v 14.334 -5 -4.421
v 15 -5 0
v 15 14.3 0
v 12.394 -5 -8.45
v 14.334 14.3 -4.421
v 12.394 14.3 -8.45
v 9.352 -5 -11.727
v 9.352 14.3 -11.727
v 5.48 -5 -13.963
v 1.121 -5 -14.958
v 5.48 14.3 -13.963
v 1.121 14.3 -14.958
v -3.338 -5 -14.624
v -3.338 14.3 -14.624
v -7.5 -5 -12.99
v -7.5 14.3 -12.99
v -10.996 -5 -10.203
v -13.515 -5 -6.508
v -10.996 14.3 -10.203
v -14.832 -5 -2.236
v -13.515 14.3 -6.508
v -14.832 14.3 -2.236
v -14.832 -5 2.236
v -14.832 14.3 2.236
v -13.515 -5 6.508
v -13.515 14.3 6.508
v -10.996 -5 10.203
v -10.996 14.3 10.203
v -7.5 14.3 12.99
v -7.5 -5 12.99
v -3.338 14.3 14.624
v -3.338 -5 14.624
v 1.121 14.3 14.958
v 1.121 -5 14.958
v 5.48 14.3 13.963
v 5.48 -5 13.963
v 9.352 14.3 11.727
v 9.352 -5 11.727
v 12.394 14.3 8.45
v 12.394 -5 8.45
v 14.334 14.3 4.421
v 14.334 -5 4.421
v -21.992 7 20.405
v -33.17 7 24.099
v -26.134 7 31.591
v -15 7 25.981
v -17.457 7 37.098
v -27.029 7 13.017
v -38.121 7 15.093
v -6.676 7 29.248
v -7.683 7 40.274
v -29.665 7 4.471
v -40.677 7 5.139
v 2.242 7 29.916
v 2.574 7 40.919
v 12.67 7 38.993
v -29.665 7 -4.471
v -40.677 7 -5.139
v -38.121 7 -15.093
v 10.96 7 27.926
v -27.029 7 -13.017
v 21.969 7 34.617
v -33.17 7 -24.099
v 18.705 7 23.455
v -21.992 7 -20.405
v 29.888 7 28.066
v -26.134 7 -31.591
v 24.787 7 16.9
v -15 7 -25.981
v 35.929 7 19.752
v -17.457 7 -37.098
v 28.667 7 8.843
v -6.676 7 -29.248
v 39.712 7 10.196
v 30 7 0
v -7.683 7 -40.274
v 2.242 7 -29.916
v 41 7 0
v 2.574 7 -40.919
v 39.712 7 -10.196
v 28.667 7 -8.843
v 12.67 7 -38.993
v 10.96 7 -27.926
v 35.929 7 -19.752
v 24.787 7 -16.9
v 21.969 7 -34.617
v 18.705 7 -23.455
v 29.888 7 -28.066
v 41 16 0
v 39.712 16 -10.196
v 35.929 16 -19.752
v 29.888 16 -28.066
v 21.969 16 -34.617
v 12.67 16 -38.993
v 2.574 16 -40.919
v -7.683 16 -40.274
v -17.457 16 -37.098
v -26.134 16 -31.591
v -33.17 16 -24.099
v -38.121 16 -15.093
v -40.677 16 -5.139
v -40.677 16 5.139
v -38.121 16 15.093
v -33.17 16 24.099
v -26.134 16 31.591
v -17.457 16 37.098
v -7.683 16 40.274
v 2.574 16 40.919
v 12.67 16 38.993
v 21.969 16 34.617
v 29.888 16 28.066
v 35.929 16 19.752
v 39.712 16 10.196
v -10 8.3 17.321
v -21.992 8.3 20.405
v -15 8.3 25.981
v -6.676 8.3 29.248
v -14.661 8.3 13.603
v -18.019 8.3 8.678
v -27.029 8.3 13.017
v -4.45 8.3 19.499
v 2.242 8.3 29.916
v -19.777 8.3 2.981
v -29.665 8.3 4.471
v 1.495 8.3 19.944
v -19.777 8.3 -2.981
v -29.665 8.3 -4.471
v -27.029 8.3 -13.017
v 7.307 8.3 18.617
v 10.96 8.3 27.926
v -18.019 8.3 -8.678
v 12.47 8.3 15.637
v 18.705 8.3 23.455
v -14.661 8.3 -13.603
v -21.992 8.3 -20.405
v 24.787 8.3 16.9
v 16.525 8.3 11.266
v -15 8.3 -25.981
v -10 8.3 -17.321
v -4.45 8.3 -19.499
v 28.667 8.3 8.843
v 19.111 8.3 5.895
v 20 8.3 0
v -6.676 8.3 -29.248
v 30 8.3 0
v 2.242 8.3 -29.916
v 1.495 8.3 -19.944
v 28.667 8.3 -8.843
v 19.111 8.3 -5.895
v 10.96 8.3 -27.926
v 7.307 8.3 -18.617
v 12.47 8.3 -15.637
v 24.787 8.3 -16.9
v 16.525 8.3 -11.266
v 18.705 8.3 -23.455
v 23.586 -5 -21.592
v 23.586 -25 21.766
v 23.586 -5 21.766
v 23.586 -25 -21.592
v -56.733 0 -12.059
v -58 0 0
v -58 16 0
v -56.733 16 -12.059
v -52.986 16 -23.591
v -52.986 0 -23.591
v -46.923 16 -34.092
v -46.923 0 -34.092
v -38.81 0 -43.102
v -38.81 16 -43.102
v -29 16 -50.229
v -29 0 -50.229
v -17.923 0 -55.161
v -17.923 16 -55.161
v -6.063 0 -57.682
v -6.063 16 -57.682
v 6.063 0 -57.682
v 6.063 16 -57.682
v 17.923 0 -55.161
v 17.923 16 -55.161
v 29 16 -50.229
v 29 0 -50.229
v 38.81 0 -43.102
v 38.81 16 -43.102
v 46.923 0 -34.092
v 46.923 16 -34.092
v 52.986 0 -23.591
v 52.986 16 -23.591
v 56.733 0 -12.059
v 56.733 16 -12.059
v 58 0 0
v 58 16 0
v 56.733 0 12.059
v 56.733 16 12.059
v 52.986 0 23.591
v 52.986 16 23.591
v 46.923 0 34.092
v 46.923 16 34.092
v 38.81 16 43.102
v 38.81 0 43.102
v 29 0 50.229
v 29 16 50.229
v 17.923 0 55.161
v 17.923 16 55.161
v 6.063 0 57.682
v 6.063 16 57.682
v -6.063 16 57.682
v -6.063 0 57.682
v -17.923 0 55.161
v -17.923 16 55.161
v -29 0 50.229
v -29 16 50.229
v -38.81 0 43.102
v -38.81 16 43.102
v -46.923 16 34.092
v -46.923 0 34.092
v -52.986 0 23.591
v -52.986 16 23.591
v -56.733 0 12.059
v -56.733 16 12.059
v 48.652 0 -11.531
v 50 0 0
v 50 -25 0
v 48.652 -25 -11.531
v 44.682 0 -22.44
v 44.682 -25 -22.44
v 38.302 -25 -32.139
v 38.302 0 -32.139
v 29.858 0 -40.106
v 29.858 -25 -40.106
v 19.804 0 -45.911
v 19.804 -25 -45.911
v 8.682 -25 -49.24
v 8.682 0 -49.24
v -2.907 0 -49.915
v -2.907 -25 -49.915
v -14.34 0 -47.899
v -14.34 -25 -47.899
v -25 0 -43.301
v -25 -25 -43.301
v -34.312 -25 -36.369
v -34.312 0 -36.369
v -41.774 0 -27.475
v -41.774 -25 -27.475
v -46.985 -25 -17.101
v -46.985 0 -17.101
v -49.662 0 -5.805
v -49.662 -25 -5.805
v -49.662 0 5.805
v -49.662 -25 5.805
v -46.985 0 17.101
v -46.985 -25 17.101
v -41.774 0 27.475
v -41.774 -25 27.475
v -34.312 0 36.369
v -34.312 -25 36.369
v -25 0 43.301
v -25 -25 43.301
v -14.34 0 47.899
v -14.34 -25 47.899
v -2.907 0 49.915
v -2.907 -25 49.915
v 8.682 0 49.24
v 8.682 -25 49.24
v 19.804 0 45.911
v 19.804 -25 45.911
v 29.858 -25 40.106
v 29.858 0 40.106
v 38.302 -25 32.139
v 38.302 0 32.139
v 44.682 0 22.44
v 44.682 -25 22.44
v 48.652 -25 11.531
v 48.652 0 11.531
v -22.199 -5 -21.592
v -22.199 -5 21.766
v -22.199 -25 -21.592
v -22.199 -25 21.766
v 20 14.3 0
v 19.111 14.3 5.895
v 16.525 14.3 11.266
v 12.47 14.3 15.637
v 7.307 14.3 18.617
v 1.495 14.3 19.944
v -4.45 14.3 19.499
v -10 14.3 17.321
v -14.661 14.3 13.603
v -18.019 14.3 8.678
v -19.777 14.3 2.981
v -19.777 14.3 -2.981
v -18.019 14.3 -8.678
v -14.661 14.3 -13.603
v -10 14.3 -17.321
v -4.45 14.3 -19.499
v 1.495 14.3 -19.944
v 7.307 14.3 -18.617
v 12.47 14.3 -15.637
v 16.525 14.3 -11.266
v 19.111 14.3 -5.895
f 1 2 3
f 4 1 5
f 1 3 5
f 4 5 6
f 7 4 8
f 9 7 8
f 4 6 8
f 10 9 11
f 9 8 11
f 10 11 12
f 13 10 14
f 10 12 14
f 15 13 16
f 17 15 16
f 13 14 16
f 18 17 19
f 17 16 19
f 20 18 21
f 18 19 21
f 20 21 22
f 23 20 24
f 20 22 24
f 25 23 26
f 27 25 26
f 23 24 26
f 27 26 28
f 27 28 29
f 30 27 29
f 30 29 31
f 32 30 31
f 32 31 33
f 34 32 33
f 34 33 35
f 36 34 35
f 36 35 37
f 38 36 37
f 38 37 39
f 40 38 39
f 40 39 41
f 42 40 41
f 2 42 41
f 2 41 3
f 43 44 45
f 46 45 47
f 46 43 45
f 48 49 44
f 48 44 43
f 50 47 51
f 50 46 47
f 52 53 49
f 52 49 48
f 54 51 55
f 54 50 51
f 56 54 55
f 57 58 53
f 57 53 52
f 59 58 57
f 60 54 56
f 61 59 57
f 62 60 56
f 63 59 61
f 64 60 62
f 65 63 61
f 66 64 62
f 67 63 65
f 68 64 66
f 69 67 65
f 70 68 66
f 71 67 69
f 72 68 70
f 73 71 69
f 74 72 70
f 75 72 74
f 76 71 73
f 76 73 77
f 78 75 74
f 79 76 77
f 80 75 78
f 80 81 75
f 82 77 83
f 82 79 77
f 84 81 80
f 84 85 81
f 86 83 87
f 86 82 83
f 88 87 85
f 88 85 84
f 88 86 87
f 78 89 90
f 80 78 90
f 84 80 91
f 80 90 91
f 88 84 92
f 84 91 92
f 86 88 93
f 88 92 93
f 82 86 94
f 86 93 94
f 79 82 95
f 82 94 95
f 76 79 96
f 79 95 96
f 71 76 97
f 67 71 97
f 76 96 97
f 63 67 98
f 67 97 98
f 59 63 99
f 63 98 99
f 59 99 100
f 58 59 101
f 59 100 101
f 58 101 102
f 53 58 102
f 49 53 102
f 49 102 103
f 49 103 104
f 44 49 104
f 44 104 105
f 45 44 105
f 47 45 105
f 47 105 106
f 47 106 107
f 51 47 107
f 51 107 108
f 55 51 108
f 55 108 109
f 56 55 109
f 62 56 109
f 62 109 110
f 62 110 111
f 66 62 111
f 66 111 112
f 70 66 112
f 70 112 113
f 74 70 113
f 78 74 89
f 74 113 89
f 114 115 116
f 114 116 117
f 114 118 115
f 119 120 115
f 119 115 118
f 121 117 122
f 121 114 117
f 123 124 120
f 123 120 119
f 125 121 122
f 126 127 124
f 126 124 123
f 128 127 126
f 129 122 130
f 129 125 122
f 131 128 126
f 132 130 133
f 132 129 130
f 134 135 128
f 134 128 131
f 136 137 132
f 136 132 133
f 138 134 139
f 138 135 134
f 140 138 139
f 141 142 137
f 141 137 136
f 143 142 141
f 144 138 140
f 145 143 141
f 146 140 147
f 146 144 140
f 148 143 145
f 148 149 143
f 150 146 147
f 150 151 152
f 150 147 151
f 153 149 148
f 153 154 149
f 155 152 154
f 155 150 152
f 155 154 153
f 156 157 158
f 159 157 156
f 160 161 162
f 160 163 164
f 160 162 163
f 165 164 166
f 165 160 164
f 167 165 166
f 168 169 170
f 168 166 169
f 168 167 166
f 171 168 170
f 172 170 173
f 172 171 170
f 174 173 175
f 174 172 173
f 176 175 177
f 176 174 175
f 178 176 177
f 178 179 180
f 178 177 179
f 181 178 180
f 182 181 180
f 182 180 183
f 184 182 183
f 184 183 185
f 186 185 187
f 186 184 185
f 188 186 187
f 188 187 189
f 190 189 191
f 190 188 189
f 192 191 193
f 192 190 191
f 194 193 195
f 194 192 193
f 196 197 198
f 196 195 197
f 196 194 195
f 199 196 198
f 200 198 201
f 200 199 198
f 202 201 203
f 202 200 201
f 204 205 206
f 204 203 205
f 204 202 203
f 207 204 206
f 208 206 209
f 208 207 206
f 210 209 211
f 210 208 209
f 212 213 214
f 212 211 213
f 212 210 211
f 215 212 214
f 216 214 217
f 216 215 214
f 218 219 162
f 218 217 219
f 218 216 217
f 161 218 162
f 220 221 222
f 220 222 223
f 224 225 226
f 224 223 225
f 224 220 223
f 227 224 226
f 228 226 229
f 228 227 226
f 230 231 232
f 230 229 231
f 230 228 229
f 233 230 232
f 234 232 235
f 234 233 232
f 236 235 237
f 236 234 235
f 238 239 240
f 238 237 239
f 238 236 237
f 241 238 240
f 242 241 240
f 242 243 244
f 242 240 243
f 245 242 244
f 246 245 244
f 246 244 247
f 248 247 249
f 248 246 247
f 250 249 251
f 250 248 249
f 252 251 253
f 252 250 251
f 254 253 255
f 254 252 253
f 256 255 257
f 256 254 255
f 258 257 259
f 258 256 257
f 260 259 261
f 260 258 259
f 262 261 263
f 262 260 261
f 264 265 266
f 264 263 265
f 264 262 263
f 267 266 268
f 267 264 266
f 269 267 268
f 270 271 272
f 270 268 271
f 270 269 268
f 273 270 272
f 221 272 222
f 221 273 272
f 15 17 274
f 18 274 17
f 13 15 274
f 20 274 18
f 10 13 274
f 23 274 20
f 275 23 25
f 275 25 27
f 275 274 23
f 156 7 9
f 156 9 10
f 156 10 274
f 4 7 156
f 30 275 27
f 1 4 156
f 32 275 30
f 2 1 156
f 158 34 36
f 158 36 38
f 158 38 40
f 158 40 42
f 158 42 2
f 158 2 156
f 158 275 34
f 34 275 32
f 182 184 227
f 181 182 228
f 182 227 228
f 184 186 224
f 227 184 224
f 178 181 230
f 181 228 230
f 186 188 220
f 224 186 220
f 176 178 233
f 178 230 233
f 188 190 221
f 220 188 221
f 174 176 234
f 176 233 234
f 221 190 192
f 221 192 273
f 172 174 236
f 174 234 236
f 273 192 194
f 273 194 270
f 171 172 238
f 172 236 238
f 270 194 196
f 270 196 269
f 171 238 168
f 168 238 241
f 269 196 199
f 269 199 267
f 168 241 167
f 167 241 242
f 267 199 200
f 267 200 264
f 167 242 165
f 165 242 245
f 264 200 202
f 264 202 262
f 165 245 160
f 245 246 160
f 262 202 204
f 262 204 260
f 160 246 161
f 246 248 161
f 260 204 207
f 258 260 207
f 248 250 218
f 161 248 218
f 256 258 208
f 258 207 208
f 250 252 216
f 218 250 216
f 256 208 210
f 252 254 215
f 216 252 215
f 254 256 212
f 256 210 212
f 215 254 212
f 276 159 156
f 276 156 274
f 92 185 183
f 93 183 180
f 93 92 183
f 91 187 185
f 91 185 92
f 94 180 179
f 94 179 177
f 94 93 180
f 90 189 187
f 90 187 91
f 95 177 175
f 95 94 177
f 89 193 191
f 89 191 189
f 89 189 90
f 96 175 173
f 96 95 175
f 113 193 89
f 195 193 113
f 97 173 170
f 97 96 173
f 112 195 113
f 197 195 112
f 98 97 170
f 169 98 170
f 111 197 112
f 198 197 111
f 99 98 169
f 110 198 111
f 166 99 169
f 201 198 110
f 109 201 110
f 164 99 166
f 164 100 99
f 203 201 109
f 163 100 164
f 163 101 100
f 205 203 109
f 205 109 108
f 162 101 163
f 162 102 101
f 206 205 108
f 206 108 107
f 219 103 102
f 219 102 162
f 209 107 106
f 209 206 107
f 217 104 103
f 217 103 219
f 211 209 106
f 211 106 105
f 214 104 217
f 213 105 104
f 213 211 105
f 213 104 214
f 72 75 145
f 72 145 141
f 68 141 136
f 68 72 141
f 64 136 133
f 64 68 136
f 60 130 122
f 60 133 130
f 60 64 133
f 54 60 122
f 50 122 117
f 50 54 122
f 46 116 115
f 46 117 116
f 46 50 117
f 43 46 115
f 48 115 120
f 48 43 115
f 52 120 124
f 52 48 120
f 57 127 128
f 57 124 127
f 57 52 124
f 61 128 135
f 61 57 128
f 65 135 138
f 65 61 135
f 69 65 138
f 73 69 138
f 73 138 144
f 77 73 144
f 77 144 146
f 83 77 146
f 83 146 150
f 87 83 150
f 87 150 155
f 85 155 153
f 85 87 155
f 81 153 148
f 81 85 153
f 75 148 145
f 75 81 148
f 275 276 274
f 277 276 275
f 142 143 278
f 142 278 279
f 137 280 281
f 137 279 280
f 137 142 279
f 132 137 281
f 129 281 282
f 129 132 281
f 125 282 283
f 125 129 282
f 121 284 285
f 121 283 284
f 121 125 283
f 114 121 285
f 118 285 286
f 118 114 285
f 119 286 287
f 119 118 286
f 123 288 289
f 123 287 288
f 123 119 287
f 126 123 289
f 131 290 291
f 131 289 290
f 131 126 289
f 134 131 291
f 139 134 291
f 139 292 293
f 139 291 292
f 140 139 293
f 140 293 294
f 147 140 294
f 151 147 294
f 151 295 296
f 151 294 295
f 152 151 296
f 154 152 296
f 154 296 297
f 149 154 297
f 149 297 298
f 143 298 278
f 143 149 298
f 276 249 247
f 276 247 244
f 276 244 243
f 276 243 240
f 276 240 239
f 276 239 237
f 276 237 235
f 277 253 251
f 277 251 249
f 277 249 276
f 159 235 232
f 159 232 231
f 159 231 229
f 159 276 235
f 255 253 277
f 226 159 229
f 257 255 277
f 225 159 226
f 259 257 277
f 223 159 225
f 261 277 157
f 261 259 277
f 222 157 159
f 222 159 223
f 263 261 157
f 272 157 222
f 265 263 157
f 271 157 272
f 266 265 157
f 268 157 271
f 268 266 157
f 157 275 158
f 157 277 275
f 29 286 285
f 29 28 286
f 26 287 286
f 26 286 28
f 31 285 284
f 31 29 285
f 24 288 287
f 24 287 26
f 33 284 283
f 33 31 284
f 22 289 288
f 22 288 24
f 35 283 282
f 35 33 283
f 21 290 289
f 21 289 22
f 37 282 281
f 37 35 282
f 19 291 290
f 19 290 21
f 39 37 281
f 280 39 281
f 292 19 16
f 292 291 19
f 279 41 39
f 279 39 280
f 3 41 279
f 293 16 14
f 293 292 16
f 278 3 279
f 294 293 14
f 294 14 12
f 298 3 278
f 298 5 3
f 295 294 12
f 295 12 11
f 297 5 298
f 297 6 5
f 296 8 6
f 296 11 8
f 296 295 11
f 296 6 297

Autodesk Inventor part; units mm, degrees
ref_plane "YZ Plane" through (0, 0, 0) normal (1, 0, 0) x (0, 1, 0)
ref_plane "XZ Plane" through (0, 0, 0) normal (0, 1, 0) x (-1, 0, 0)
ref_plane "XY Plane" through (0, 0, 0) normal (0, 0, 1) x (1, 0, 0)
sketch "Sketch1" plane through (0, 0, 0) normal (0, 1, 0) x (-1, 0, 0)
  circle A0 centre (0, 0) radius 58
  dimension "d0" = 116
extrude "Extrusion1" add sketch "Sketch1" along normal blind 16
sketch "Sketch2" plane through (0, 16, 0) normal (0, 1, 0) x (1, 0, 0)
  circle A0 centre (0, 0) radius 41
  dimension "d3" = 82
extrude "Extrusion2" cut sketch "Sketch2" against normal blind 9
sketch "Sketch3" plane through (0, 0, 0) normal (0, -1, 0) x (1, 0, 0)
  circle A0 centre (0, 0) radius 50
  dimension "d6" = 100
extrude "Extrusion3" add sketch "Sketch3" along normal blind 25
sketch "Sketch4" plane through (0, 7, 0) normal (0, 1, 0) x (1, 0, 0)
  circle A0 centre (0, 0) radius 30
  dimension "d9" = 60
extrude "Extrusion4" add sketch "Sketch4" along normal blind 1.3
sketch "Sketch6" plane through (0, 8.3, 0) normal (0, 1, 0) x (1, 0, 0)
  circle A0 centre (0, 0) radius 20
  dimension "d12" = 40
extrude "Extrusion5" add sketch "Sketch6" along normal blind 6
sketch "Sketch7" plane through (0, 14.3, 0) normal (0, 1, 0) x (1, 0, 0)
  circle A0 centre (0, 0) radius 15
  dimension "d15" = 30
extrude "Extrusion6" cut sketch "Sketch7" against normal blind 50
sketch "Sketch8" plane through (0, -25, 0) normal (0, -1, 0) x (1, 0, 0)
  line L0 (-22.1991, 21.7655) -> (23.5865, 21.7655)
  line L1 (23.5865, 21.7655) -> (23.5865, -21.5921)
  line L2 (23.5865, -21.5921) -> (-22.1991, -21.5921)
  line L3 (-22.1991, -21.5921) -> (-22.1991, 21.7655)
  point P0 (0, 0)
extrude "Extrusion7" cut sketch "Sketch8" against normal blind 20
